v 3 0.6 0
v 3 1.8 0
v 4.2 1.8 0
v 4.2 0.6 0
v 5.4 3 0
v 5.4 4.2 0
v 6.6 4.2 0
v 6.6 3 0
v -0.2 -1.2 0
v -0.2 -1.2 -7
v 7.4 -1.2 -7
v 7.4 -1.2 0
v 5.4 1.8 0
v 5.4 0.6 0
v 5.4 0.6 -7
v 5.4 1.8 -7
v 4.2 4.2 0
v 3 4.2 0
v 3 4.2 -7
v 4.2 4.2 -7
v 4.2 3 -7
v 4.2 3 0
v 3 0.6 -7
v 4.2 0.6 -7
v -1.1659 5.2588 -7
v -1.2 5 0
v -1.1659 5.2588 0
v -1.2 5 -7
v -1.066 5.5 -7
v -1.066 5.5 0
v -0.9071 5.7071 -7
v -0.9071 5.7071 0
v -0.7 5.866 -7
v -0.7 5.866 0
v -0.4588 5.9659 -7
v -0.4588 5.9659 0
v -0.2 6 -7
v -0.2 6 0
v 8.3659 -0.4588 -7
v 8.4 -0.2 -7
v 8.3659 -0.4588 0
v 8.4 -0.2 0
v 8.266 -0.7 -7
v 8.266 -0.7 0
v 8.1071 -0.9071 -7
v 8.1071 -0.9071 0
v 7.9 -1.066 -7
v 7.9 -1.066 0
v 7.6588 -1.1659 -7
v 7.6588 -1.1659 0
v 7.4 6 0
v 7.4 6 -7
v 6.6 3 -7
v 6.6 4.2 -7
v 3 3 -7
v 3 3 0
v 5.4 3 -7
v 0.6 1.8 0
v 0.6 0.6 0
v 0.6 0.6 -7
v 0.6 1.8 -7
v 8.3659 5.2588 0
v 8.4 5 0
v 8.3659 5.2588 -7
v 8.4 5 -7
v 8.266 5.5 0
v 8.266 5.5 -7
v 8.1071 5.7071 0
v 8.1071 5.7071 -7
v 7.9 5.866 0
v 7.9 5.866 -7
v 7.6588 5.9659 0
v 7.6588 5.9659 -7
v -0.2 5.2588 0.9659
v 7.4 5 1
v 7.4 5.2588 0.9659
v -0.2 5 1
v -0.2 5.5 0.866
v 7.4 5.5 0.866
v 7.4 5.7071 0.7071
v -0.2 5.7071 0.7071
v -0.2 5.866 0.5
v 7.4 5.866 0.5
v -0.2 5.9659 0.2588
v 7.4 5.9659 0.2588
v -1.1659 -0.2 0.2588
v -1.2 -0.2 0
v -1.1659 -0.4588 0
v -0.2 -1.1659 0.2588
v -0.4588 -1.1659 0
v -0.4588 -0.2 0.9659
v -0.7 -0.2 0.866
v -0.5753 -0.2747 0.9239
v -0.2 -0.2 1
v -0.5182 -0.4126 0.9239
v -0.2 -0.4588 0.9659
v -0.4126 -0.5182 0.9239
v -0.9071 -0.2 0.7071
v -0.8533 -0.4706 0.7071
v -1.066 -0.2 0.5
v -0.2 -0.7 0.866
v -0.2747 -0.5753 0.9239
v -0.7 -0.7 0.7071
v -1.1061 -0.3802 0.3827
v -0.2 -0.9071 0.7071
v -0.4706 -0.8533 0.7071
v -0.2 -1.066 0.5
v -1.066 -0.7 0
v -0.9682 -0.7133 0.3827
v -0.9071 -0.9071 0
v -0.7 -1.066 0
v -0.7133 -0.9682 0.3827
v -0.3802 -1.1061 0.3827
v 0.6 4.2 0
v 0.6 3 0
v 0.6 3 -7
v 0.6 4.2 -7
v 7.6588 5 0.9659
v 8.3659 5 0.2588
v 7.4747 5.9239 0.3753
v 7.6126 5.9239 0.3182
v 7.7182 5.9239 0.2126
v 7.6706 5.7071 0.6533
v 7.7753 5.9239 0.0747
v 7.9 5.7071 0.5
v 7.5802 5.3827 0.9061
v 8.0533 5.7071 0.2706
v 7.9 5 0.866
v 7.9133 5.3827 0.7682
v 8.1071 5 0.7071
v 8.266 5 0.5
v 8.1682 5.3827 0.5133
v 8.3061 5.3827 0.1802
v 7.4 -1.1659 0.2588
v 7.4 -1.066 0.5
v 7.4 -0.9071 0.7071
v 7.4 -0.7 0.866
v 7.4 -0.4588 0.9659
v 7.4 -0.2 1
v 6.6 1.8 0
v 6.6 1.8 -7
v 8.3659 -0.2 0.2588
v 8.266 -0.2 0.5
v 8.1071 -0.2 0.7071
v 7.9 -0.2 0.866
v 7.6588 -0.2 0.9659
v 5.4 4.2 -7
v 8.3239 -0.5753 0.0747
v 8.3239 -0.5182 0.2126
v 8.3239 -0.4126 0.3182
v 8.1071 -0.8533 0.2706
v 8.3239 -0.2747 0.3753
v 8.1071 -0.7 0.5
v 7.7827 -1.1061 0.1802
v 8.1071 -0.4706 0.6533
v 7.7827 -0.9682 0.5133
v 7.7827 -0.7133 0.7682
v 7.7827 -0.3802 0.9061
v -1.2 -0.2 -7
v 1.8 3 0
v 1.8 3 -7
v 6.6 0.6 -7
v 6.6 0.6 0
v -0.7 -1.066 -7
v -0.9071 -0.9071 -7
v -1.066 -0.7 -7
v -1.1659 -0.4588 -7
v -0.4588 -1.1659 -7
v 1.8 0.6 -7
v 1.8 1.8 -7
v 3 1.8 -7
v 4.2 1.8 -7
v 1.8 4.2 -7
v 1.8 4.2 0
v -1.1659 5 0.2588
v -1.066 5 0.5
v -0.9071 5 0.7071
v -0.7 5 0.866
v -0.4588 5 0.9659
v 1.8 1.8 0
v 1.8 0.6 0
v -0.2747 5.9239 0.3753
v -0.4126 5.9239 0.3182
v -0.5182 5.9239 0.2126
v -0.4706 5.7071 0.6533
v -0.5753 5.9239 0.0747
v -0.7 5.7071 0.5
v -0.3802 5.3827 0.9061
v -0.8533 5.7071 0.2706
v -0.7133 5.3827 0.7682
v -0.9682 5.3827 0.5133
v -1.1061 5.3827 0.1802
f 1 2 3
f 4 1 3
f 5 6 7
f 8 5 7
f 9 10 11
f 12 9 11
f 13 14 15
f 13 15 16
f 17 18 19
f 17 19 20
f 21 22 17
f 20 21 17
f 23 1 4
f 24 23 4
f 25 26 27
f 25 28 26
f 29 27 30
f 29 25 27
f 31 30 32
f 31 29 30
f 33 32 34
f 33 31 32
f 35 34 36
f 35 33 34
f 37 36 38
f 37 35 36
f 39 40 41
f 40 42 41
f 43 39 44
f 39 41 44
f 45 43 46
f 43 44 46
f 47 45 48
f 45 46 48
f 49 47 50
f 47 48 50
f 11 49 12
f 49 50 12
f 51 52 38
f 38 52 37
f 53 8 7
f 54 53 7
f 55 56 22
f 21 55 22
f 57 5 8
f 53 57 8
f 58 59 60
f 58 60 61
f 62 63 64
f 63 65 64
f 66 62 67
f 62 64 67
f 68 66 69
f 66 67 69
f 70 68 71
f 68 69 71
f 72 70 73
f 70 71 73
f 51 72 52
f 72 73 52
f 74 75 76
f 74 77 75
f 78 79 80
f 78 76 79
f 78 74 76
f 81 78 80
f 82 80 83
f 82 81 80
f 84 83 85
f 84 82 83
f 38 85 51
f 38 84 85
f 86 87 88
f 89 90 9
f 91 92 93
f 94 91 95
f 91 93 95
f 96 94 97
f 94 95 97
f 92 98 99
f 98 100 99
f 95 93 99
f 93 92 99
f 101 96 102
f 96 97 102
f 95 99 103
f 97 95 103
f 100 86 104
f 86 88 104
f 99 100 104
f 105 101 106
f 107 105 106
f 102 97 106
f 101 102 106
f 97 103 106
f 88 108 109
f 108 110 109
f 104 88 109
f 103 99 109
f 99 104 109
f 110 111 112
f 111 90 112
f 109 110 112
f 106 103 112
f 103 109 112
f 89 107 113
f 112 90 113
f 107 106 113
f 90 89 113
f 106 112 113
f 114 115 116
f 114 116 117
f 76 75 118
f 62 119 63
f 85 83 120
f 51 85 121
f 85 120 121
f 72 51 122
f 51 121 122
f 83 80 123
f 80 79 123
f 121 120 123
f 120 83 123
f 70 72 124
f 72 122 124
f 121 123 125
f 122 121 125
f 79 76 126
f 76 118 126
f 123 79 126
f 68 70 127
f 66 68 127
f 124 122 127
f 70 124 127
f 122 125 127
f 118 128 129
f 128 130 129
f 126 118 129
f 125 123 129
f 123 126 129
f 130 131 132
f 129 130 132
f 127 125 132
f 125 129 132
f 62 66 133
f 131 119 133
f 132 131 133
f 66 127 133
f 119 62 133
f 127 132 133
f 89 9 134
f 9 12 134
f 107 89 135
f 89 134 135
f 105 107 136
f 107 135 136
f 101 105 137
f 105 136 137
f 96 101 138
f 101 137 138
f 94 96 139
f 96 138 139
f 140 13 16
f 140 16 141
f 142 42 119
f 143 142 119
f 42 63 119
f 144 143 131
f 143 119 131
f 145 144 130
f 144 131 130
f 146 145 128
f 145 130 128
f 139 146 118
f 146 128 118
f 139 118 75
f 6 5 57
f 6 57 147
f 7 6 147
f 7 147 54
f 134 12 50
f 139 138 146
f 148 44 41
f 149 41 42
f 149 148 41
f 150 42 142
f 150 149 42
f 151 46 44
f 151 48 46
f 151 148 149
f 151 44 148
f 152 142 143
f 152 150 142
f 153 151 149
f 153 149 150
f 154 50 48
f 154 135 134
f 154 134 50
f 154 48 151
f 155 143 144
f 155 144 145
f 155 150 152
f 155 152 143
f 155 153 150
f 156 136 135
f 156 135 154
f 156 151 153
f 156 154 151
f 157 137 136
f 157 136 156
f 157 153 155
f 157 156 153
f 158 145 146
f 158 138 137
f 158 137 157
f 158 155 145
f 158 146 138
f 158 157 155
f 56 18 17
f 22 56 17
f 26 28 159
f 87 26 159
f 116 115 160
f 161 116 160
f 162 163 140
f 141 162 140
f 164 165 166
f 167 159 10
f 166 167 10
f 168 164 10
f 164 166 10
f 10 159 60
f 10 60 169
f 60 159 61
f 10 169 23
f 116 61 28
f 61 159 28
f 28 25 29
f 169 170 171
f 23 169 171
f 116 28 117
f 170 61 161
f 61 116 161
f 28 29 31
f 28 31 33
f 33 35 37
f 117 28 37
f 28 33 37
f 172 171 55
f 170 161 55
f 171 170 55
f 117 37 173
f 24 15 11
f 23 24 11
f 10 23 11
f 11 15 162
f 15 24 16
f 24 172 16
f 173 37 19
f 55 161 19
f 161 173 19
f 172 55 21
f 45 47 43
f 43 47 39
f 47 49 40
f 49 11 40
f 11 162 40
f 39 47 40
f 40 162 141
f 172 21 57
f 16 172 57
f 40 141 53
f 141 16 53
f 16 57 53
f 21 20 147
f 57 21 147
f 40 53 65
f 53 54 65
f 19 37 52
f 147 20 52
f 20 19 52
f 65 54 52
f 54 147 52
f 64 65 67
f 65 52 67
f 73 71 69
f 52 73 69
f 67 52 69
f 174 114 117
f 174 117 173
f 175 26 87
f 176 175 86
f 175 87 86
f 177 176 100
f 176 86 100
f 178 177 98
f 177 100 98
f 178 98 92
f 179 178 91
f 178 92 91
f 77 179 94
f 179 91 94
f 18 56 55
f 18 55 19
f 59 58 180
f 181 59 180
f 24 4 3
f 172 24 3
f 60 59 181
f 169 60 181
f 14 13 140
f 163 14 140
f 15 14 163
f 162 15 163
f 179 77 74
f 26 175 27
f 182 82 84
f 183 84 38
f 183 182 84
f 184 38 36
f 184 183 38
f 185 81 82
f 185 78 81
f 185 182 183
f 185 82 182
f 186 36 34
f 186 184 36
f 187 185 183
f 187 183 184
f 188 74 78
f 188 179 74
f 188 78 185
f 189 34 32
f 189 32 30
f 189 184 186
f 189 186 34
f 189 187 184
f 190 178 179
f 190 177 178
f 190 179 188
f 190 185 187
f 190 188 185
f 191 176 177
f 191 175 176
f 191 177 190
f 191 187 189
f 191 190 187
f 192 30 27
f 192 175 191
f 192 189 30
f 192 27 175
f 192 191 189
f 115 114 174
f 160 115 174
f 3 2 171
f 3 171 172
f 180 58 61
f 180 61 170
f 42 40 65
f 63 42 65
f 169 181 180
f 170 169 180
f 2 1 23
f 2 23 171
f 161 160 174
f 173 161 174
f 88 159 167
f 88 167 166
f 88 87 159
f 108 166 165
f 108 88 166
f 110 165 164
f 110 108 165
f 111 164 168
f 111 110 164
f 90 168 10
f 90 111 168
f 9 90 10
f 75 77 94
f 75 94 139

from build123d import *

# Parameters (mm, degrees)
F0_W     = 2.4
F0_H     = 2.4
F0_W_2   = 1.2
F0_H_2   = 1.2
F1_DEPTH = 7
F2_DEPTH = 1
F3_R     = 1


# Not quite as in the source:
# - a feature names something its author has since deleted; it is built from what else it names


with BuildPart() as f1:
    # F0 (on Top) → F1 (new body)
    with BuildSketch(Plane.XY):
        Polygon((-1.2, 6), (-1.2, 2.4), (-1.2, -1.2), (2.4, -1.2), (4.8, -1.2), (8.4, -1.2), (8.4, 2.4), (8.4, 6), (4.8, 6), (2.4, 6), align=None)
        Polygon((2.4, 0), (0, 0), (0, 2.4), (0, 4.8), (2.4, 4.8), (4.8, 4.8), (7.2, 4.8), (7.2, 2.4), (7.2, 0), (4.8, 0), align=None, mode=Mode.SUBTRACT)
        with Locations((1.2, 3.6)):
            Rectangle(F0_W, F0_H)
        with Locations((1.2, 3.6)):
            Rectangle(F0_W_2, F0_H_2, mode=Mode.SUBTRACT)
        with Locations((3.6, 3.6)):
            Rectangle(F0_W, F0_H)
        with Locations((3.6, 3.6)):
            Rectangle(F0_W_2, F0_H_2, mode=Mode.SUBTRACT)
        with Locations((6, 3.6)):
            Rectangle(F0_W, F0_H)
        with Locations((6, 3.6)):
            Rectangle(F0_W_2, F0_H_2, mode=Mode.SUBTRACT)
        with Locations((6, 1.2)):
            Rectangle(F0_W, F0_H)
        with Locations((6, 1.2)):
            Rectangle(F0_W_2, F0_H_2, mode=Mode.SUBTRACT)
        with Locations((3.6, 1.2)):
            Rectangle(F0_W, F0_H)
        with Locations((3.6, 1.2)):
            Rectangle(F0_W_2, F0_H_2, mode=Mode.SUBTRACT)
        with Locations((1.2, 1.2)):
            Rectangle(F0_W, F0_H)
        with Locations((1.2, 1.2)):
            Rectangle(F0_W_2, F0_H_2, mode=Mode.SUBTRACT)
    extrude(amount=-F1_DEPTH)

    # F0 (on Top) → F2 (join)
    with BuildSketch(Plane.XY):
        Polygon((-1.2, 6), (-1.2, 2.4), (-1.2, -1.2), (2.4, -1.2), (4.8, -1.2), (8.4, -1.2), (8.4, 2.4), (8.4, 6), (4.8, 6), (2.4, 6), align=None)
        Polygon((2.4, 0), (0, 0), (0, 2.4), (0, 4.8), (2.4, 4.8), (4.8, 4.8), (7.2, 4.8), (7.2, 2.4), (7.2, 0), (4.8, 0), align=None, mode=Mode.SUBTRACT)
        with Locations((3.6, 3.6)):
            Rectangle(F0_W, F0_H)
        with Locations((3.6, 3.6)):
            Rectangle(F0_W_2, F0_H_2, mode=Mode.SUBTRACT)
        with Locations((6, 3.6)):
            Rectangle(F0_W, F0_H)
        with Locations((6, 3.6)):
            Rectangle(F0_W_2, F0_H_2, mode=Mode.SUBTRACT)
        with Locations((1.2, 3.6)):
            Rectangle(F0_W, F0_H)
        with Locations((1.2, 3.6)):
            Rectangle(F0_W_2, F0_H_2, mode=Mode.SUBTRACT)
        with Locations((1.2, 1.2)):
            Rectangle(F0_W, F0_H)
        with Locations((1.2, 1.2)):
            Rectangle(F0_W_2, F0_H_2, mode=Mode.SUBTRACT)
        with Locations((3.6, 1.2)):
            Rectangle(F0_W, F0_H)
        with Locations((3.6, 1.2)):
            Rectangle(F0_W_2, F0_H_2, mode=Mode.SUBTRACT)
        with Locations((6, 1.2)):
            Rectangle(F0_W, F0_H)
        with Locations((6, 1.2)):
            Rectangle(F0_W_2, F0_H_2, mode=Mode.SUBTRACT)
        with Locations((6, 3.6)):
            Rectangle(F0_W_2, F0_H_2)
        with Locations((3.6, 3.6)):
            Rectangle(F0_W_2, F0_H_2)
        with Locations((1.2, 3.6)):
            Rectangle(F0_W_2, F0_H_2)
        with Locations((1.2, 1.2)):
            Rectangle(F0_W_2, F0_H_2)
        with Locations((3.6, 1.2)):
            Rectangle(F0_W_2, F0_H_2)
        with Locations((6, 1.2)):
            Rectangle(F0_W_2, F0_H_2)
    extrude(amount=F2_DEPTH)

    # F3
    f3_edges = [f1.edges().sort_by_distance(p)[0] for p in [
        (-1.2, -1.2, -3),
        (-1.2, 2.4, 1),
        (3.6, -1.2, 1),
        (8.4, -1.2, -3),
        (8.4, 2.4, 1),
        (3.6, 6, 1),
        (8.4, 6, -3),
        (-1.2, 6, -3),
    ]]
    fillet(f3_edges, radius=F3_R)


solid = f1.part
